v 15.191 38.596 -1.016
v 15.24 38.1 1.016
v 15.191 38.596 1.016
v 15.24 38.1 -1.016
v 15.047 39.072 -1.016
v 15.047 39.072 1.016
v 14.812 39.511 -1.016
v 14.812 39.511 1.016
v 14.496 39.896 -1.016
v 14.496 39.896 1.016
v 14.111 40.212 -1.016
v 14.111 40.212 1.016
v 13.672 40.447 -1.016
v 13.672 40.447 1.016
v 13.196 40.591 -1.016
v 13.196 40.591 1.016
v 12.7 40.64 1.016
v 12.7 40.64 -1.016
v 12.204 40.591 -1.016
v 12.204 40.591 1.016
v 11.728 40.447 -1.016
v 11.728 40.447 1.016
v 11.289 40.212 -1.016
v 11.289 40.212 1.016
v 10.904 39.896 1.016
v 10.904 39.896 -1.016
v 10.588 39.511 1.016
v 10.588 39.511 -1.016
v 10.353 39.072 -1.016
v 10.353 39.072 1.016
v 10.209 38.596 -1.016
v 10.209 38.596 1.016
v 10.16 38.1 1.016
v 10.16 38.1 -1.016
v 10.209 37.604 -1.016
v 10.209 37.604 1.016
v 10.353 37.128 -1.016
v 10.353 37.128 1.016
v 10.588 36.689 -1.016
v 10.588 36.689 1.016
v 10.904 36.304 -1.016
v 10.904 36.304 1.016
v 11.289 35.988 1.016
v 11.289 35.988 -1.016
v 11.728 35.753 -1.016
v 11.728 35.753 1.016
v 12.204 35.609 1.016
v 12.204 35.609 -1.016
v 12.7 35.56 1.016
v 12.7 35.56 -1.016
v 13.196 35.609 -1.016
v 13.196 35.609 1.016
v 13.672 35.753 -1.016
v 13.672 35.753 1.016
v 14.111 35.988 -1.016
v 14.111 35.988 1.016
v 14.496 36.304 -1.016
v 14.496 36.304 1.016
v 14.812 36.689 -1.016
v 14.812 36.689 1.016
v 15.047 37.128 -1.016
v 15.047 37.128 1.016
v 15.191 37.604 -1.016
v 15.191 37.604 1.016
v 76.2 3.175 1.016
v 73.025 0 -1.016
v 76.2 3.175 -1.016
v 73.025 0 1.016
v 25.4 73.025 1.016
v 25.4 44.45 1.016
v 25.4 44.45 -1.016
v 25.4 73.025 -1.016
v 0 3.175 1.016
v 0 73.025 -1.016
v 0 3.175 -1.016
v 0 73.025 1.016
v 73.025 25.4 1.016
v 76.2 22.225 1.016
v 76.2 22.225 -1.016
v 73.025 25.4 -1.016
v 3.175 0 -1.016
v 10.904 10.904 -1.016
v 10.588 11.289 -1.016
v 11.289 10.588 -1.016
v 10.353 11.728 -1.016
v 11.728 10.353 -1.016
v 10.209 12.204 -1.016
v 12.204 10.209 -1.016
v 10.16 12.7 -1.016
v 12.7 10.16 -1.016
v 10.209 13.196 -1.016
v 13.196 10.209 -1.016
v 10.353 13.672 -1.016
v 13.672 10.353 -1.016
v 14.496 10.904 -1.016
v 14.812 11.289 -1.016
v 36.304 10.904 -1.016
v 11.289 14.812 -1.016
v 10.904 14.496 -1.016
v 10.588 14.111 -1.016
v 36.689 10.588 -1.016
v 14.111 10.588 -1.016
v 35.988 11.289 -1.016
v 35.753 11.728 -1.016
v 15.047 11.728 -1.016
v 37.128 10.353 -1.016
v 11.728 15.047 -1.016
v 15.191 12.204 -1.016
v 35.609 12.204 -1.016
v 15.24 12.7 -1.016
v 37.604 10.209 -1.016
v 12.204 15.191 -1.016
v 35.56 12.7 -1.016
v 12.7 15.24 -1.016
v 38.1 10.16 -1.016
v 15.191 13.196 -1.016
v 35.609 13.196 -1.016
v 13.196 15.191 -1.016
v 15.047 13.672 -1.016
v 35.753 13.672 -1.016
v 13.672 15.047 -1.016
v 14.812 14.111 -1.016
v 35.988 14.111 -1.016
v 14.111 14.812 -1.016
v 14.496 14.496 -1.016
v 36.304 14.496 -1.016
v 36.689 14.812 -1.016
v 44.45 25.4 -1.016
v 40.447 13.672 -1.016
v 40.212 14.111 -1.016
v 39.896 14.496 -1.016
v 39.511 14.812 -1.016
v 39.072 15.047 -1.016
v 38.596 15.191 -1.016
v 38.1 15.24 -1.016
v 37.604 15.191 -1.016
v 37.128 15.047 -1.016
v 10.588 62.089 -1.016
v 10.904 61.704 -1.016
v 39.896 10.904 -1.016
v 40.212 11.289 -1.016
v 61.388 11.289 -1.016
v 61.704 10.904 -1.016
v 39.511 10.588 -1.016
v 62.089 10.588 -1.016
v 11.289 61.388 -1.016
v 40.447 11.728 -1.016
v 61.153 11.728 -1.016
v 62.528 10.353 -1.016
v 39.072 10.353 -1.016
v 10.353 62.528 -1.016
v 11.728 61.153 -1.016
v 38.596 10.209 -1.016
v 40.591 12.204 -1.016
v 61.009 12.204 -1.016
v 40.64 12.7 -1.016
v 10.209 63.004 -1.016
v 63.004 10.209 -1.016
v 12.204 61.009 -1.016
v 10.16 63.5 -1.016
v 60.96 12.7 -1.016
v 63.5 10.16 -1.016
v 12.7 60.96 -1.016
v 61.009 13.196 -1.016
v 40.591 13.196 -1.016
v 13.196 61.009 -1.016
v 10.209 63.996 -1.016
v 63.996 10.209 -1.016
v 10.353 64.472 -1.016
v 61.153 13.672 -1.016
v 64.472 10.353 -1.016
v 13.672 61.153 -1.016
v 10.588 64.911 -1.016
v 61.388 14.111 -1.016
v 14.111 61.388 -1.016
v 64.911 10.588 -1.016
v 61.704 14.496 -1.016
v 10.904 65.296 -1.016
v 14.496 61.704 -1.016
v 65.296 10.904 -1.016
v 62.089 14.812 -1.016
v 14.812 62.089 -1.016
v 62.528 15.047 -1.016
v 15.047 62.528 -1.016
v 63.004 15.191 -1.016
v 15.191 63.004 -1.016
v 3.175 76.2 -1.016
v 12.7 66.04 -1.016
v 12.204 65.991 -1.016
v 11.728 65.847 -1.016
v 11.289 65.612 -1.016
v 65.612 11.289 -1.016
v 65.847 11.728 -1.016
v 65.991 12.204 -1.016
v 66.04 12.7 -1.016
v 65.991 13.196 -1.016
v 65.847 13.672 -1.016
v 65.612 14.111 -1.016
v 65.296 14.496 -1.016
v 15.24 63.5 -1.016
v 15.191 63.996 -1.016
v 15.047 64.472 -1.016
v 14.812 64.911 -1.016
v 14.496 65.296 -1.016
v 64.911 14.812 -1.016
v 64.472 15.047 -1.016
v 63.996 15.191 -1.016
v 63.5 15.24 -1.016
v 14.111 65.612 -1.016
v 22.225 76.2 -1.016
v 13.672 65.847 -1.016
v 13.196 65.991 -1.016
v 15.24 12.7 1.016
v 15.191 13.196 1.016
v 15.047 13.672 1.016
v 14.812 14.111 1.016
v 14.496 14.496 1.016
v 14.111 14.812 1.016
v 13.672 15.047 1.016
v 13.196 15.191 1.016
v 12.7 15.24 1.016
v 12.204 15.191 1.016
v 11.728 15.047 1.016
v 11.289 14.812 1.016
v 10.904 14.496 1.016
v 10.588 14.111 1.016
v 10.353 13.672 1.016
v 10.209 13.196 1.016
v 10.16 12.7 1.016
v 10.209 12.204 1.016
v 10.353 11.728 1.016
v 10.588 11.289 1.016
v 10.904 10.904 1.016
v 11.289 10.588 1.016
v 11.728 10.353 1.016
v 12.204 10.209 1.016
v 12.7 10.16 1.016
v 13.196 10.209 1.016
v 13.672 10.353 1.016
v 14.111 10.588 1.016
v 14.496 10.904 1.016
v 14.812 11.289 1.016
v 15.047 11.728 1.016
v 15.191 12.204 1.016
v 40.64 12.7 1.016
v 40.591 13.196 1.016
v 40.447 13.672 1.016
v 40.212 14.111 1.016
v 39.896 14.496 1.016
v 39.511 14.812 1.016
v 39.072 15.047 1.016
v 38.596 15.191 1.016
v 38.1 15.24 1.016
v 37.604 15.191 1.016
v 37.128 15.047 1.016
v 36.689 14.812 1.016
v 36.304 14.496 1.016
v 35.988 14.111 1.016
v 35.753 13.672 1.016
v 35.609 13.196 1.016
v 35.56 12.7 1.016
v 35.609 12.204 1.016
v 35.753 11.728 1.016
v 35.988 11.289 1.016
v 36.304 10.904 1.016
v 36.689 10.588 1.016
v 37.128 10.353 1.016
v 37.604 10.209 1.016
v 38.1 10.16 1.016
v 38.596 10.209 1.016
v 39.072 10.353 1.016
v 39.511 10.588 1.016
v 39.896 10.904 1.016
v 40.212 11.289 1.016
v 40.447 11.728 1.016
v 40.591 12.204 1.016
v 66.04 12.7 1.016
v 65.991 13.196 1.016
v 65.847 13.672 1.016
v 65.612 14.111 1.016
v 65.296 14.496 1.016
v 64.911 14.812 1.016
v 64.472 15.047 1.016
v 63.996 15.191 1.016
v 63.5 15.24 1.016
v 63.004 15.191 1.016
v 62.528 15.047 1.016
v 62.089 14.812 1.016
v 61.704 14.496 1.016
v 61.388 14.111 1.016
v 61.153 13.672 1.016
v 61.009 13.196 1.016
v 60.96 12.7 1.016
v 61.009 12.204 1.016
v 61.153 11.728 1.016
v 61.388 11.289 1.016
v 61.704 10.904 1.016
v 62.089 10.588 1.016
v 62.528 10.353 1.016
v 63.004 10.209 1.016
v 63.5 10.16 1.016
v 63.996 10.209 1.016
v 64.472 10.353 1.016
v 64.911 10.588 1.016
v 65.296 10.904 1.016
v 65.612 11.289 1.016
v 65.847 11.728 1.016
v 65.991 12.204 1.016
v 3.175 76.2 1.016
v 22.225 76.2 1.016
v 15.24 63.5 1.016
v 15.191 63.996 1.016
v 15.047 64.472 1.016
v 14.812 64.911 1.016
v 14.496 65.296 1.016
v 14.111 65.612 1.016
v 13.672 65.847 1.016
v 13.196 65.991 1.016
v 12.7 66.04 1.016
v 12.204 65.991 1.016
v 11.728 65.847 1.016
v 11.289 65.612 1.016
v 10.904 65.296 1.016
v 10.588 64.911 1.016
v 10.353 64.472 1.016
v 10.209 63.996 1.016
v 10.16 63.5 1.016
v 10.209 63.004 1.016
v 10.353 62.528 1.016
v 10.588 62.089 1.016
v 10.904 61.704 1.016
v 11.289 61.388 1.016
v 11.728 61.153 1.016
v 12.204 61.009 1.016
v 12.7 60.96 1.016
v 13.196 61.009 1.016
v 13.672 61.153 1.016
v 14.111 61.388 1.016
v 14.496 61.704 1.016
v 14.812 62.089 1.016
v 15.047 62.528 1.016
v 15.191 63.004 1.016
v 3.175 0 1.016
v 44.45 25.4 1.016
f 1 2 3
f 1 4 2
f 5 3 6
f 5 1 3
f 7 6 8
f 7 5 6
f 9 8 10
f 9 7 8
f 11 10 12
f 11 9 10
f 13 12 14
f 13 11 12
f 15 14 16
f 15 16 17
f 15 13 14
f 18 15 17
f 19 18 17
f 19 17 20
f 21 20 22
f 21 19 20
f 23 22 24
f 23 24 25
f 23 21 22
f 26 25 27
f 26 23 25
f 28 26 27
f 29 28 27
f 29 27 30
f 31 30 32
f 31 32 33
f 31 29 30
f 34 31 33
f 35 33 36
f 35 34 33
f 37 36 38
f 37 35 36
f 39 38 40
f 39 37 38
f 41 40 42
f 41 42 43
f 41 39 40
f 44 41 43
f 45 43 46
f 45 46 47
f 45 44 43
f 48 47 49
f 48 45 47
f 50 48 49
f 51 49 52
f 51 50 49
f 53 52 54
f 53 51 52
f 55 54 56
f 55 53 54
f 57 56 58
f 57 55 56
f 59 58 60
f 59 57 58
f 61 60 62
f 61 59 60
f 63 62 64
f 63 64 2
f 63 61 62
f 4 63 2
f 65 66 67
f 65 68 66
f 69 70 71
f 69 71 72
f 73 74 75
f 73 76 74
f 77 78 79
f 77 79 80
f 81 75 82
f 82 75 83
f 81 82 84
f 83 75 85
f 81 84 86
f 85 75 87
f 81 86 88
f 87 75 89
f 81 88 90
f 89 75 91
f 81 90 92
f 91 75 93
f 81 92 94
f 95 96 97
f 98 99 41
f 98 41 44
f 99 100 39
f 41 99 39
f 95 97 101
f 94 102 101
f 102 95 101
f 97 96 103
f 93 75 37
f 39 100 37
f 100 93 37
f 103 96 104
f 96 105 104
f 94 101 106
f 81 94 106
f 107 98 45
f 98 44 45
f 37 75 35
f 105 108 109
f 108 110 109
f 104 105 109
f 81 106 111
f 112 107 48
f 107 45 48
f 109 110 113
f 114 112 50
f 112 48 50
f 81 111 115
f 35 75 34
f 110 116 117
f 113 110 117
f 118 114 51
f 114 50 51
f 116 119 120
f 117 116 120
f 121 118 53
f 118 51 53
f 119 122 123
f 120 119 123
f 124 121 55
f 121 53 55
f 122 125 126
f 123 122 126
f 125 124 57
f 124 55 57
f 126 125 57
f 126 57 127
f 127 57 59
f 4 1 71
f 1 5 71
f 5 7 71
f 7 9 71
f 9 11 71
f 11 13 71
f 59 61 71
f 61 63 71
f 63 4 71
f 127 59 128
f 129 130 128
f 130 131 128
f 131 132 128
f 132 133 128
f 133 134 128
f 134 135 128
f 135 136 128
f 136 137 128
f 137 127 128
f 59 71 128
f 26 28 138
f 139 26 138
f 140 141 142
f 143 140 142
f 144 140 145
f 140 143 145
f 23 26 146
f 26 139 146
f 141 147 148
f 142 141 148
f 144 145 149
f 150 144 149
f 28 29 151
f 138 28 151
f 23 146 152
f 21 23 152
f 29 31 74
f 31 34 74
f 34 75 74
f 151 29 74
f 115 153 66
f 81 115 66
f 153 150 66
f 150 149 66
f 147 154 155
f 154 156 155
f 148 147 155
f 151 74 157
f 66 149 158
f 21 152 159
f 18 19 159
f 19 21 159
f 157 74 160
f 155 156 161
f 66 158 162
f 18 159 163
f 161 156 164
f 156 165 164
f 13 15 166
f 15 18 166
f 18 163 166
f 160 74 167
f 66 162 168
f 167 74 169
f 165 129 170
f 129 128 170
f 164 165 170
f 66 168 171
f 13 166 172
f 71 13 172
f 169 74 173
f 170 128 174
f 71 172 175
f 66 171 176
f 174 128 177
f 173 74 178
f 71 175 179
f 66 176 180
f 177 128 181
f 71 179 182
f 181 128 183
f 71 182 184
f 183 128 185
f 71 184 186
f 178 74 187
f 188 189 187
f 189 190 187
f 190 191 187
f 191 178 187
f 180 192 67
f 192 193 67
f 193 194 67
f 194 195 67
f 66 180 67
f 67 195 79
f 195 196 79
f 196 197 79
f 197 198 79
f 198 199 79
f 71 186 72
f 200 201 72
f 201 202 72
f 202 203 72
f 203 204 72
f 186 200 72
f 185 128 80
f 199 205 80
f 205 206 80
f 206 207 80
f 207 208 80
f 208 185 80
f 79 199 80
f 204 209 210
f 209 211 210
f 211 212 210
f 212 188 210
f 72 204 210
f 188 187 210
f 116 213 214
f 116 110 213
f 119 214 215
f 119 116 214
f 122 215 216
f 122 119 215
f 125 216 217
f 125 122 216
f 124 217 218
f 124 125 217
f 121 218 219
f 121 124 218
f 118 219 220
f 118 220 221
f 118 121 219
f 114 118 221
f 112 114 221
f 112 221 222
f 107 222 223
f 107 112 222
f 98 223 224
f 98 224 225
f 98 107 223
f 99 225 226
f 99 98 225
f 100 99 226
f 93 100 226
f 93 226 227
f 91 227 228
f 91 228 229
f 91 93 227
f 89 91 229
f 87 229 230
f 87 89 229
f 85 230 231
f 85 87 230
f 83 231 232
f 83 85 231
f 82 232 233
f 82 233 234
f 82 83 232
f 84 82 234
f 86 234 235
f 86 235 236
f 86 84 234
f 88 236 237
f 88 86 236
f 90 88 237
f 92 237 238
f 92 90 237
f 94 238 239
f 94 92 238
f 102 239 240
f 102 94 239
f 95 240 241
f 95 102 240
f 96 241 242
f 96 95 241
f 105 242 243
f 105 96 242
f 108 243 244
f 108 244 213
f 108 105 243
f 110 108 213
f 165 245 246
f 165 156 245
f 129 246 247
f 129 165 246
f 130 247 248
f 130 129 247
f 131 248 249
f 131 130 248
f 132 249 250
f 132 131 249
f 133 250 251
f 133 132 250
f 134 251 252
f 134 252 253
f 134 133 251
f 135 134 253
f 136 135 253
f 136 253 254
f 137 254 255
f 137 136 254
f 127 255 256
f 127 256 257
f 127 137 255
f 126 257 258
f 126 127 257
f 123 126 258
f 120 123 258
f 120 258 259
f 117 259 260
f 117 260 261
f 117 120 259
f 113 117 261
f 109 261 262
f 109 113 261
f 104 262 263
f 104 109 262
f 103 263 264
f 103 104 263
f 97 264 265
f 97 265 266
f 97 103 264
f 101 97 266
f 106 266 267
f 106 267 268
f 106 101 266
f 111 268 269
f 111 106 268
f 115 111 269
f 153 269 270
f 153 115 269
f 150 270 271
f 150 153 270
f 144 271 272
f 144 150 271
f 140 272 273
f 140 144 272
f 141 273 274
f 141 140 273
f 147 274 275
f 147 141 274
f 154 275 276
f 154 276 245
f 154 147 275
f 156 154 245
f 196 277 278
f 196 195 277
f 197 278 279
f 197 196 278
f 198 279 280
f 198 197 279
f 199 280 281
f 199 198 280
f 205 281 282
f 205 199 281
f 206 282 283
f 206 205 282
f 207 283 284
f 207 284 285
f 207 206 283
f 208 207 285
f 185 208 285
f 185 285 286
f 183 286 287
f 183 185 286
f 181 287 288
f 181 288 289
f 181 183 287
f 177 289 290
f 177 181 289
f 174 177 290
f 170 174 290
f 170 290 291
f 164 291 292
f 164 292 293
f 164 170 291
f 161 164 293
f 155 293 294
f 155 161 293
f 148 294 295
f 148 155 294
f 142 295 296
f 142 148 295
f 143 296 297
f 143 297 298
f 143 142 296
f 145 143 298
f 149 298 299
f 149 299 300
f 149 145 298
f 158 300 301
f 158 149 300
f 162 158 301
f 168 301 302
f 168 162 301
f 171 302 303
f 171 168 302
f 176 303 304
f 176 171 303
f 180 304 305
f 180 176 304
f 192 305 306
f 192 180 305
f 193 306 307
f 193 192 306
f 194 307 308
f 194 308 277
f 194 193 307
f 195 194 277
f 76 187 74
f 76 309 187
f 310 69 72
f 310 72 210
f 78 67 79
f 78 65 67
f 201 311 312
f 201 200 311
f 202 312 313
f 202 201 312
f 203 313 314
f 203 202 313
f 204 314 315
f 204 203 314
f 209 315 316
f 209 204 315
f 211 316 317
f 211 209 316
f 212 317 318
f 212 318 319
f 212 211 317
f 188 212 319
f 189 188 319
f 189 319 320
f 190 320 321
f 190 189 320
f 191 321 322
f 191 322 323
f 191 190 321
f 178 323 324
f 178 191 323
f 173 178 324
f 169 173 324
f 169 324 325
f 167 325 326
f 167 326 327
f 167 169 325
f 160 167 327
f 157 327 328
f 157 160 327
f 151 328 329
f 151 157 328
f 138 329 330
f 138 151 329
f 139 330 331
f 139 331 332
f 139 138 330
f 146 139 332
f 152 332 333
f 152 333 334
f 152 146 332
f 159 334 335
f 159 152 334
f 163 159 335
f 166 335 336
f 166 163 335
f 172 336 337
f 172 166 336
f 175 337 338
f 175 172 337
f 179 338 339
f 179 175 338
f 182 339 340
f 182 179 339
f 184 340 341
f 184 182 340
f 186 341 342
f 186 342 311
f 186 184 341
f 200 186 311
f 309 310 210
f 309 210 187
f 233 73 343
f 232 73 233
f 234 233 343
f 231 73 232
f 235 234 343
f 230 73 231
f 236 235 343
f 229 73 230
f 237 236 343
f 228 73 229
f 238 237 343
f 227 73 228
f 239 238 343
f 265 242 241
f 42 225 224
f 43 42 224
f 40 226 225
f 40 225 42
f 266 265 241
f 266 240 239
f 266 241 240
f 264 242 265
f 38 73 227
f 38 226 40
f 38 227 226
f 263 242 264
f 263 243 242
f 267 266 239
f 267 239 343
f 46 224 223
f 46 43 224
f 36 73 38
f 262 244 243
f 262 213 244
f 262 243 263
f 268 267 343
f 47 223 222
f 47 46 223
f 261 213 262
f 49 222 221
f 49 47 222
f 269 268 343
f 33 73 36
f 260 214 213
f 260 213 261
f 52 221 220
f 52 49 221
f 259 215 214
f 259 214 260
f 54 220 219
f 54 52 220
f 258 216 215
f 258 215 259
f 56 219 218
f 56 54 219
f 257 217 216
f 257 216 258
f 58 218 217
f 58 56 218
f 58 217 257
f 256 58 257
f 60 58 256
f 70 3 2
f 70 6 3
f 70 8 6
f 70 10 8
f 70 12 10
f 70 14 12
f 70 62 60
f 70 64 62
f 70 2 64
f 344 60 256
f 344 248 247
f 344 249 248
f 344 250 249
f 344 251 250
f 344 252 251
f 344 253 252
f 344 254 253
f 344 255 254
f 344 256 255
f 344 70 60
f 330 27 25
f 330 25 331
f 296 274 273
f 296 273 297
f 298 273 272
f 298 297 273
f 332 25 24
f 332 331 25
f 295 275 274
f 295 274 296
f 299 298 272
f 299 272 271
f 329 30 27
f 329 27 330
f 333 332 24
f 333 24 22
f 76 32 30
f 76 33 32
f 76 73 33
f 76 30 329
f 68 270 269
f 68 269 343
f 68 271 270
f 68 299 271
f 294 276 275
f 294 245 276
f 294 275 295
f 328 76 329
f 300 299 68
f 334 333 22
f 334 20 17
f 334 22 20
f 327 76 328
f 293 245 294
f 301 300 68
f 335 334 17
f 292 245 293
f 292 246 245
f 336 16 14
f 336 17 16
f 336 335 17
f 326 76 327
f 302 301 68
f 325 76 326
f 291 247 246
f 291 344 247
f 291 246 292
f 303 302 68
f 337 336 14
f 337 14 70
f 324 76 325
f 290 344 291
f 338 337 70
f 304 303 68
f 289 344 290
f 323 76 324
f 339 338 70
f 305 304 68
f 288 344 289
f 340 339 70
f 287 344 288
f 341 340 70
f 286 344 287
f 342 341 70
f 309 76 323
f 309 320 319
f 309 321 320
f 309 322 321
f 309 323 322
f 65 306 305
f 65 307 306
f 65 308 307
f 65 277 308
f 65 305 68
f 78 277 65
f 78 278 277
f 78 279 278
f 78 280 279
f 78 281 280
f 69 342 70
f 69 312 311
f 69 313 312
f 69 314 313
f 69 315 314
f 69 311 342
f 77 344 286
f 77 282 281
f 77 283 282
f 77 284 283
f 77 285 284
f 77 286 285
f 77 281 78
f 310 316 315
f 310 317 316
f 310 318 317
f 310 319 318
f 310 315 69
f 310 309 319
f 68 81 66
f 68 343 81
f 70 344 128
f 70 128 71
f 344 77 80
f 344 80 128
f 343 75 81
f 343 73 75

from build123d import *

# Parameters (mm, degrees)
SKETCH1_R           = 2.54
BOSS_EXTRUDE1_DEPTH = 1.016


with BuildPart() as part:
    # Sketch1 → Boss-Extrude1 (new, symmetric)
    with BuildSketch(Plane.XY):
        Polygon((76.2, 3.175), (76.2, 22.225), (73.025, 25.4), (44.45, 25.4), (25.4, 44.45), (25.4, 73.025), (22.225, 76.2), (3.175, 76.2), (0, 73.025), (0, 3.175), (3.175, 0), (73.025, 0), align=None)
        with Locations((12.7, 12.7)):
            Circle(SKETCH1_R, mode=Mode.SUBTRACT)
        with Locations((12.7, 38.1)):
            Circle(SKETCH1_R, mode=Mode.SUBTRACT)
        with Locations((12.7, 63.5)):
            Circle(SKETCH1_R, mode=Mode.SUBTRACT)
        with Locations((38.1, 12.7)):
            Circle(SKETCH1_R, mode=Mode.SUBTRACT)
        with Locations((63.5, 12.7)):
            Circle(SKETCH1_R, mode=Mode.SUBTRACT)
    extrude(amount=BOSS_EXTRUDE1_DEPTH, both=True)


solid = part.part
